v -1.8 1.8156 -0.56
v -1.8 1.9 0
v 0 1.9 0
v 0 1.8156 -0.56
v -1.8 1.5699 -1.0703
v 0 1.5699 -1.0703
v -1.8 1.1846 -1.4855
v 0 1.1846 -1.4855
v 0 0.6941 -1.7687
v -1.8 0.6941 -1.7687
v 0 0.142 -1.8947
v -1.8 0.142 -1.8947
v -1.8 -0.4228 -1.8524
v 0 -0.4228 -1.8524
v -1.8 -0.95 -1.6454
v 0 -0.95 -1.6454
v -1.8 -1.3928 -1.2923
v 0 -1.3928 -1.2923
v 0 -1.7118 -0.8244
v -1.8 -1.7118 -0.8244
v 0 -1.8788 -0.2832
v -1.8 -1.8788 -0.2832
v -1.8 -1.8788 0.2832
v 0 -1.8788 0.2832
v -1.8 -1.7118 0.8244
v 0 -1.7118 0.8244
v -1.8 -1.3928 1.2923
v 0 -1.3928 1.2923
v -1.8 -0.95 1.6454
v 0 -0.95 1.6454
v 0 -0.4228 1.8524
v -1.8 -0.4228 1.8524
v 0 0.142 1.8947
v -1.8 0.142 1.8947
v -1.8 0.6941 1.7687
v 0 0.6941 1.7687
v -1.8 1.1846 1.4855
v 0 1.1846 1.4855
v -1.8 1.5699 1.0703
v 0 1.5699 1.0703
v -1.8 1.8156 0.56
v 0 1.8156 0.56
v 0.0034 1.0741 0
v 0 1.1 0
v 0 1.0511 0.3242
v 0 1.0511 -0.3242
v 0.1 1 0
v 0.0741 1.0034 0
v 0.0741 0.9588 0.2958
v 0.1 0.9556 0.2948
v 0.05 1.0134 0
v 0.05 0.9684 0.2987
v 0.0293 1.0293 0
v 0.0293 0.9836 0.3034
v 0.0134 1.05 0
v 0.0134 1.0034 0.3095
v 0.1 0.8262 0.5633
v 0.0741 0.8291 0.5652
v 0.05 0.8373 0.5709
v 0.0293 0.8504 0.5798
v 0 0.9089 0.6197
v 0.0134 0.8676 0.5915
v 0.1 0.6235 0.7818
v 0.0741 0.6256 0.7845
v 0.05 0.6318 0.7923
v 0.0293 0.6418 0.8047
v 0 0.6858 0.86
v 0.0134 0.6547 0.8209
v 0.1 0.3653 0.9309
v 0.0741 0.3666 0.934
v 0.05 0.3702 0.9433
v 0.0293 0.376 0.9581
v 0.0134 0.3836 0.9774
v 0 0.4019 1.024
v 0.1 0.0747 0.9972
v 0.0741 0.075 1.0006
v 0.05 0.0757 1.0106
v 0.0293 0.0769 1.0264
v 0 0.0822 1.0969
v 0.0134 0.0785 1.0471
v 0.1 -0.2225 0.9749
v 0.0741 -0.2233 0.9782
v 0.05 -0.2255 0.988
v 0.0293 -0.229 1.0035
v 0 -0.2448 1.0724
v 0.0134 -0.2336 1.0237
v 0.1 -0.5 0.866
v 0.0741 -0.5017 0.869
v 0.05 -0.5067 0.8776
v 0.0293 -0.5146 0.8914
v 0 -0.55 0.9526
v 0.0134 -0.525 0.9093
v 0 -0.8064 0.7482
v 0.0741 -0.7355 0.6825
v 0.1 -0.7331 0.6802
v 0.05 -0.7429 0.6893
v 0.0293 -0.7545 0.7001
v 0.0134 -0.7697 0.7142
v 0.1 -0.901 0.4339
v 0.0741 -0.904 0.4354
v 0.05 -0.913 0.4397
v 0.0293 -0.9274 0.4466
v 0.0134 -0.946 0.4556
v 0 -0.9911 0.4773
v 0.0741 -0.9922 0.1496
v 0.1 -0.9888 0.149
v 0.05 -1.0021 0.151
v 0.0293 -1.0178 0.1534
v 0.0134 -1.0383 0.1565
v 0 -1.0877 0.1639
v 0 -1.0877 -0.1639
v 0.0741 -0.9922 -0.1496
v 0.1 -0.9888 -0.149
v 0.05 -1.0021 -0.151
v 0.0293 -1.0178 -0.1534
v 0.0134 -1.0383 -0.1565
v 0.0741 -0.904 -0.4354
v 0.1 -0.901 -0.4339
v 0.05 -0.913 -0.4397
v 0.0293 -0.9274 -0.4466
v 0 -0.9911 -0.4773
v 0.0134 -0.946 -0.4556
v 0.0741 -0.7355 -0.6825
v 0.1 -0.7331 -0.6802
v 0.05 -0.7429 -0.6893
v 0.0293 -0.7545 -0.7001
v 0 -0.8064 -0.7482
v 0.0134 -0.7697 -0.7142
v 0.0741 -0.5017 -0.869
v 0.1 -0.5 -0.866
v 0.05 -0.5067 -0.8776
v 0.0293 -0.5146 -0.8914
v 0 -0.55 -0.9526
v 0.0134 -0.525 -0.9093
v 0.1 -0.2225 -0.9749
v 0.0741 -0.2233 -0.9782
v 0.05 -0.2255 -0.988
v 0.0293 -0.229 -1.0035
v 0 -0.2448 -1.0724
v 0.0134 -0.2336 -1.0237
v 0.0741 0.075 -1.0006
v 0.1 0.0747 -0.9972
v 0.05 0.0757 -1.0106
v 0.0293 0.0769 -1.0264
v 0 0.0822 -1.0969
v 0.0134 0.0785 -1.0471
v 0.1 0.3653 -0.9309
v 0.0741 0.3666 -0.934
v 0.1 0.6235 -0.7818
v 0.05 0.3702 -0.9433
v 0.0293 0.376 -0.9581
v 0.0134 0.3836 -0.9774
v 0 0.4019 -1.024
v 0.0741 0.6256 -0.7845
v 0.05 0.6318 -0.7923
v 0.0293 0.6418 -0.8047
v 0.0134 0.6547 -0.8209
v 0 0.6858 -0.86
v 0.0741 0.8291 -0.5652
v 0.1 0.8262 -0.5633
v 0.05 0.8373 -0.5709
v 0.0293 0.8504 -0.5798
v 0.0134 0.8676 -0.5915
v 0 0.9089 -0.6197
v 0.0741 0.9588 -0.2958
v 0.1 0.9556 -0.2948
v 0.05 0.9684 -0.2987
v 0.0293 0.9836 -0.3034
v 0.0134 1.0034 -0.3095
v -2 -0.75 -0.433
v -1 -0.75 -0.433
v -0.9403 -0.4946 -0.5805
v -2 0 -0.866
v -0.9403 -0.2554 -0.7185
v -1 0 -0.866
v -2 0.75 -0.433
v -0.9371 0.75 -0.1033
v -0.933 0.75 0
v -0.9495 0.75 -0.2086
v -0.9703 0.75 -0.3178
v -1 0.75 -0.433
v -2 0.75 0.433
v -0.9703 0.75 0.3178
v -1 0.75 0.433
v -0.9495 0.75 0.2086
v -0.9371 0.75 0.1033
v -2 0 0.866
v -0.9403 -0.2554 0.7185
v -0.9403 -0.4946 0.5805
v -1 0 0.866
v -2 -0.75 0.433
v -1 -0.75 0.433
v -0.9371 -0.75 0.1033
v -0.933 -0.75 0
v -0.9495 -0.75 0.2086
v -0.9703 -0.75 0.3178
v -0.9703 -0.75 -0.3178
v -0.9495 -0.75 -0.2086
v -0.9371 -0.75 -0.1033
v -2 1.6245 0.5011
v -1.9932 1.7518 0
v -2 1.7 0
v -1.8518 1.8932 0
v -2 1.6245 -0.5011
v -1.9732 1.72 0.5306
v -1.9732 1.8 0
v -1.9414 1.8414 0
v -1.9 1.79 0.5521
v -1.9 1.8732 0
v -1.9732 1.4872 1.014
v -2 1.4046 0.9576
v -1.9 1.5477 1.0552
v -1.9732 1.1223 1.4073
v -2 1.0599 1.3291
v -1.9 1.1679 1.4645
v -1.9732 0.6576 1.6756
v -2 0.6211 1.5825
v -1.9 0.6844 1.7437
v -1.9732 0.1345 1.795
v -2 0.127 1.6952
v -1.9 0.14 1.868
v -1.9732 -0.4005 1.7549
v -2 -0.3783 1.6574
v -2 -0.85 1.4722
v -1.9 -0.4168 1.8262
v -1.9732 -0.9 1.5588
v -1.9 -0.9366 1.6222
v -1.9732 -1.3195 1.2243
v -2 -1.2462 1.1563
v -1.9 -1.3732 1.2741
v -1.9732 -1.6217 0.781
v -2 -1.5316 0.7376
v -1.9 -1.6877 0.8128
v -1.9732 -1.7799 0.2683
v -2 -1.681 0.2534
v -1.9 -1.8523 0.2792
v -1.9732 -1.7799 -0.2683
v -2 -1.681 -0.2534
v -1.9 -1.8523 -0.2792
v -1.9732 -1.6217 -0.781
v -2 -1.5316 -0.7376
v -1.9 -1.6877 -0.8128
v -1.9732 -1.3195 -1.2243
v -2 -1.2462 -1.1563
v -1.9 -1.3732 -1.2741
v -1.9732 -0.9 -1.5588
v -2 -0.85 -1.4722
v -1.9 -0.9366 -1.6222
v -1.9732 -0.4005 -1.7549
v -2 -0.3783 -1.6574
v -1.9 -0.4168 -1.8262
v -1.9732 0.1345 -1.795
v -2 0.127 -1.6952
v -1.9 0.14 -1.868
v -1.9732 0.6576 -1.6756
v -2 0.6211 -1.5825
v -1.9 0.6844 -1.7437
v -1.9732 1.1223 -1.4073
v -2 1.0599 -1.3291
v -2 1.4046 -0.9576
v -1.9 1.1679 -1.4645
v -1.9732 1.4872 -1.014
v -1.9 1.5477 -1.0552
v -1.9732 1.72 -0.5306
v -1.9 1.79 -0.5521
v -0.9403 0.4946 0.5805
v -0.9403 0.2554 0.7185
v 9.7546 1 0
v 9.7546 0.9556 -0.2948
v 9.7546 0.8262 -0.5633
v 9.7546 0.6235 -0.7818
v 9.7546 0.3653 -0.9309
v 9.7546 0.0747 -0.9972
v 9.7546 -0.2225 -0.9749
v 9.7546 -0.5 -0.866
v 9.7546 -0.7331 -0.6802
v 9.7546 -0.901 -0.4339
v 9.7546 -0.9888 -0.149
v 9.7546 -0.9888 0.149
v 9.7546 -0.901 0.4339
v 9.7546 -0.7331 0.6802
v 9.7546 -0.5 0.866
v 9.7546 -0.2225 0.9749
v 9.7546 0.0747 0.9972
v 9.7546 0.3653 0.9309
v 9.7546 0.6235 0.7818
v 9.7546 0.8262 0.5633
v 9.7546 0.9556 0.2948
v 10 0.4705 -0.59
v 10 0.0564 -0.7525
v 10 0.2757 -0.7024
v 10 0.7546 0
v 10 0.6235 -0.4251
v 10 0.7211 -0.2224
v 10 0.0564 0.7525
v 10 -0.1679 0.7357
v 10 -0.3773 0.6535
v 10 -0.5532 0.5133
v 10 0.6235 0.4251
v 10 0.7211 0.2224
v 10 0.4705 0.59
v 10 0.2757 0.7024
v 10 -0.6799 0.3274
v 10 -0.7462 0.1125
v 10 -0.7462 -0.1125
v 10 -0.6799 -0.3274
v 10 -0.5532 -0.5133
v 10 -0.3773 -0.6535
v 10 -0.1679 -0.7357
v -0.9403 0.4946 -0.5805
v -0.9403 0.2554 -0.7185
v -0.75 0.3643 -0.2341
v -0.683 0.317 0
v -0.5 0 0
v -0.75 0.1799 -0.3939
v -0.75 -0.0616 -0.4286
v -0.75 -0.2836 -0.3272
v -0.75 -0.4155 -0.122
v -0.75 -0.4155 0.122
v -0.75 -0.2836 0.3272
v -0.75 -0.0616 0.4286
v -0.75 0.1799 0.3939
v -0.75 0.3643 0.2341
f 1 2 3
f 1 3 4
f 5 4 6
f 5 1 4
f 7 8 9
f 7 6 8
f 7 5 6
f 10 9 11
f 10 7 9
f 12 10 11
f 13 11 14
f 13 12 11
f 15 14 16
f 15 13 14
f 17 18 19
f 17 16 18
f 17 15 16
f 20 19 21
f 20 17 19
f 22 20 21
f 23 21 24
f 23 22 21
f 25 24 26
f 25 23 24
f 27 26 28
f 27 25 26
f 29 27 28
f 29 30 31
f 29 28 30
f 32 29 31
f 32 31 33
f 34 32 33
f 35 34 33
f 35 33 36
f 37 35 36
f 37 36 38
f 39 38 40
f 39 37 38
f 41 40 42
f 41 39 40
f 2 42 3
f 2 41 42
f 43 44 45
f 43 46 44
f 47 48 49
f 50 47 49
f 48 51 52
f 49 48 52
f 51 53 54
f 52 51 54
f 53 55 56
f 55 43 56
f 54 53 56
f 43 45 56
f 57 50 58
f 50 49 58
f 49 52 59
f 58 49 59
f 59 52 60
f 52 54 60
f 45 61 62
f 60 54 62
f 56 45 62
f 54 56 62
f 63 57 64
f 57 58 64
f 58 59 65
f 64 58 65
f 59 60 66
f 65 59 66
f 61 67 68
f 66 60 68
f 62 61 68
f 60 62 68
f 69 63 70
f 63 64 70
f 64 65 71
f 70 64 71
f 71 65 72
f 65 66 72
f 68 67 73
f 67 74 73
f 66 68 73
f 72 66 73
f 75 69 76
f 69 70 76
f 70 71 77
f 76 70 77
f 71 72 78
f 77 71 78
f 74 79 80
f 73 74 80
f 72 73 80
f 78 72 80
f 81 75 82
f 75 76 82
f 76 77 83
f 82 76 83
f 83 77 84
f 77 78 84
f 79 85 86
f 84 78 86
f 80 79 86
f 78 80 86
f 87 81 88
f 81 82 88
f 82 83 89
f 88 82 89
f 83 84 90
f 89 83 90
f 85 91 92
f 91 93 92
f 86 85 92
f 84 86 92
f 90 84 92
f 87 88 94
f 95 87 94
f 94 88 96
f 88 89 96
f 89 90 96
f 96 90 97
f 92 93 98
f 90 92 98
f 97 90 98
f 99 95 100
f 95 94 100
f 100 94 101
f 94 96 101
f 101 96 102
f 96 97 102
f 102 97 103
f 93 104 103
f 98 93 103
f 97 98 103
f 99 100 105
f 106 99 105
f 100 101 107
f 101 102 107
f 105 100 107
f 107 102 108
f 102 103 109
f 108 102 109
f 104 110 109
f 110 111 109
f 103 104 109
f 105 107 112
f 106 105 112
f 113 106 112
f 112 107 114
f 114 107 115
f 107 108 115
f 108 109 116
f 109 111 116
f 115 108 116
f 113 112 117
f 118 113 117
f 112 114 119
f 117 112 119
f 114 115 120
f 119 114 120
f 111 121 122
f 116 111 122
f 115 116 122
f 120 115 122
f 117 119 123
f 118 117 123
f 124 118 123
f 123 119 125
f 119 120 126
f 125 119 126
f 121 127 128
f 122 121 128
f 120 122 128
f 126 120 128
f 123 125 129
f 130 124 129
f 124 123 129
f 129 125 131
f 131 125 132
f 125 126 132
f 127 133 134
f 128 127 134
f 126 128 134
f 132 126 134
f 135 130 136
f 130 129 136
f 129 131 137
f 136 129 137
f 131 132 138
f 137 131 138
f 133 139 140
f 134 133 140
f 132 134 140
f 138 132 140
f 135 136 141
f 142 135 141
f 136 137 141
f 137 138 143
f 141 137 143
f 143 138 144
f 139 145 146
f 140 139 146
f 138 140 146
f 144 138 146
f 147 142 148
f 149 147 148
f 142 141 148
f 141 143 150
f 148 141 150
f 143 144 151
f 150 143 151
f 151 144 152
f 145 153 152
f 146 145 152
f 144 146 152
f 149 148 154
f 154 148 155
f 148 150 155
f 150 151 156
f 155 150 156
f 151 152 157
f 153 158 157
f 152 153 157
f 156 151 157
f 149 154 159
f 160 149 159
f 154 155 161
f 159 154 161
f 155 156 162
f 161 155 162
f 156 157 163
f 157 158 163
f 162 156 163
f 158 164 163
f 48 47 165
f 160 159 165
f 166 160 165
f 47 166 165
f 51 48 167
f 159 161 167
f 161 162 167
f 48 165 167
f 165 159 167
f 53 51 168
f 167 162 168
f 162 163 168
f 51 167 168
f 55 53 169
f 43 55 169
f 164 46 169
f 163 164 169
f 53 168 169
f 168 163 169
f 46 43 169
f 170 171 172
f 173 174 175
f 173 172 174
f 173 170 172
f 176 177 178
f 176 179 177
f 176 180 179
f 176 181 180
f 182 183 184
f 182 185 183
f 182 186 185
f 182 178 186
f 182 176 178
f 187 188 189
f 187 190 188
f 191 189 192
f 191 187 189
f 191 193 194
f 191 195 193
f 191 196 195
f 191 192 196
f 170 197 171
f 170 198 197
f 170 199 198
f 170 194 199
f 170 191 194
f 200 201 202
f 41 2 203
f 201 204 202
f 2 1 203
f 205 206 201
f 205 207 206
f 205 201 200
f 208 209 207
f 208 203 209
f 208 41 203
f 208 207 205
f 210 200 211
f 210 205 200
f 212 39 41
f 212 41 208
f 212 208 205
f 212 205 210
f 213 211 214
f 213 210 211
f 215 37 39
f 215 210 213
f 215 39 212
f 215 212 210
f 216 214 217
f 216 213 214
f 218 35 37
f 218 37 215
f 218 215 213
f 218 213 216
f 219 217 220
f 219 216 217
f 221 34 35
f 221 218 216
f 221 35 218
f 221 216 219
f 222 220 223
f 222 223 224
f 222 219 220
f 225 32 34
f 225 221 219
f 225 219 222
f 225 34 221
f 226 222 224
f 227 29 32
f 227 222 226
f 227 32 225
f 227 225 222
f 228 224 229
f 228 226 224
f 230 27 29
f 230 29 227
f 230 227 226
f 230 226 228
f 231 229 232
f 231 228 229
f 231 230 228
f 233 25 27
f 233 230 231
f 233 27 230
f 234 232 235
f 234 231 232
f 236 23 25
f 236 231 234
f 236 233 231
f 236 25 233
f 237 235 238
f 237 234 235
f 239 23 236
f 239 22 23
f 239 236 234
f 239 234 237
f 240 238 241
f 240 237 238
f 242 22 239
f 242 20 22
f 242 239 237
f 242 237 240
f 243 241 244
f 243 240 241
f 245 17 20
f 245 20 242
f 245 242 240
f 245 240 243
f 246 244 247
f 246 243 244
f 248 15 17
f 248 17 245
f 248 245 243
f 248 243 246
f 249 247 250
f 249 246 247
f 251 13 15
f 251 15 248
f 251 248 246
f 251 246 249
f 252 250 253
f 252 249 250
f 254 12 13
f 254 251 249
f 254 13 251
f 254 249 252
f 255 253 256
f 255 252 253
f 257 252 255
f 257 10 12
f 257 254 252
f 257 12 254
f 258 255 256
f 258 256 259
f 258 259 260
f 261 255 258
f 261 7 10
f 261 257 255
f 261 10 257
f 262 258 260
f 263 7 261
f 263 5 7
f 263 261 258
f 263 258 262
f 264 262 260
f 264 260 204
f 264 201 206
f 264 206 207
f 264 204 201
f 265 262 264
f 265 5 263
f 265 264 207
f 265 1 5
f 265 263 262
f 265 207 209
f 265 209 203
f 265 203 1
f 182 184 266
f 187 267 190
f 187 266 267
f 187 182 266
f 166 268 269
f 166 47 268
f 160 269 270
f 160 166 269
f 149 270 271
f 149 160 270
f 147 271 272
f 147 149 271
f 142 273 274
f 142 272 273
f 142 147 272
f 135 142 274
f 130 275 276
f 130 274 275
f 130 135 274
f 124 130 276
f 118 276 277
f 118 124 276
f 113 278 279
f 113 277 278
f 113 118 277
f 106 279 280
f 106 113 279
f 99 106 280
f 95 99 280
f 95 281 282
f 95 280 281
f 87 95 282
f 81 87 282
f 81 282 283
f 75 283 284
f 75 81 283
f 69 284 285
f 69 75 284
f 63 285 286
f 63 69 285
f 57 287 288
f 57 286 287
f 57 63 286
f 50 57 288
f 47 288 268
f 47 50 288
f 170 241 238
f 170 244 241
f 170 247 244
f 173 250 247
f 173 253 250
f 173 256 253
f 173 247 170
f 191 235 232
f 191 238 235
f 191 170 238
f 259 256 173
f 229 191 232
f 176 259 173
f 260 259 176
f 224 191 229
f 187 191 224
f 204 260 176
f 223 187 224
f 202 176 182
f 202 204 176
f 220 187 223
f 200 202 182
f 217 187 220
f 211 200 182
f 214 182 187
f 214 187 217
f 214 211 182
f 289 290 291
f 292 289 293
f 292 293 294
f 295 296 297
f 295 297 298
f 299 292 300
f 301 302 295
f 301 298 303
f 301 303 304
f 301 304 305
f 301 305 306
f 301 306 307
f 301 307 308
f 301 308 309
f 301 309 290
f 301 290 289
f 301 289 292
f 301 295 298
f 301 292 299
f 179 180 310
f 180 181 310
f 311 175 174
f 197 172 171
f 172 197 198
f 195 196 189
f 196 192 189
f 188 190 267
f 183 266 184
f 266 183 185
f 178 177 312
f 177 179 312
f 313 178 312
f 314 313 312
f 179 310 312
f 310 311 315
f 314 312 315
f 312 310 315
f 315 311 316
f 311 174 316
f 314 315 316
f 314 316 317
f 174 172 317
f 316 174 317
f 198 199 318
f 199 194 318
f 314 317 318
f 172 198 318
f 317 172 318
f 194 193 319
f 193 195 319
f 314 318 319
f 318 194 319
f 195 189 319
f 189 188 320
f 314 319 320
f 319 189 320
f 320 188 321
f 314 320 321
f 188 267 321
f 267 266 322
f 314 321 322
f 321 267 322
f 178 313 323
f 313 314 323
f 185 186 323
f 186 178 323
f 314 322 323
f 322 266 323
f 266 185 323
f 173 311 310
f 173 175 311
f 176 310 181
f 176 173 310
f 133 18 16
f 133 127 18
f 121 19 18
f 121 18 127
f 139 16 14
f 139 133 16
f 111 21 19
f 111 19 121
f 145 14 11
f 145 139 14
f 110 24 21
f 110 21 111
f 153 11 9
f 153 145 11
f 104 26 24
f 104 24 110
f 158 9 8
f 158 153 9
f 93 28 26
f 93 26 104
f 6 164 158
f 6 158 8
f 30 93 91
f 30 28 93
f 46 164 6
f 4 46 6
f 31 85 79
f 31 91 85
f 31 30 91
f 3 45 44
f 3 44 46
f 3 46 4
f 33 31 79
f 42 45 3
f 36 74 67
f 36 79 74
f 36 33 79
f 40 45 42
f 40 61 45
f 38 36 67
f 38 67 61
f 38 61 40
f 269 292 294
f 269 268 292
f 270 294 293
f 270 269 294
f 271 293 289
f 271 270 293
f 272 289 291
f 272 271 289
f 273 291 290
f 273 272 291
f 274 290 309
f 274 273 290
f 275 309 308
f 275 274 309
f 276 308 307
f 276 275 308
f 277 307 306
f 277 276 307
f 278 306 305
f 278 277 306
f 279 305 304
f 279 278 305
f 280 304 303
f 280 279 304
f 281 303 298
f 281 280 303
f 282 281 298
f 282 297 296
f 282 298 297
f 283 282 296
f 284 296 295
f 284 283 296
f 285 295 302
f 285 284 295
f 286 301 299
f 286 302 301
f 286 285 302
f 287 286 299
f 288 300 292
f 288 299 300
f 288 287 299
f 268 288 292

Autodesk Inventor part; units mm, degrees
ref_plane "YZ Plane" through (0, 0, 0) normal (1, 0, 0) x (0, 1, 0)
ref_plane "XZ Plane" through (0, 0, 0) normal (0, 1, 0) x (-1, 0, 0)
sketch "Skizze1" plane through (0, 0, 0) normal (0, 0, 1) x (1, 0, 0)
  line L0 (-0.5, 0) -> (10, 0)
  line L1 (10, 0) -> (10, 1)
  line L2 (10, 1) -> (1.2, 1)
  line L3 (1.2, 1) -> (0.9545, 1)
  line L4 (0.9545, 1) -> (0, 1)
  line L5 (0, 1) -> (0, 1.9)
  line L6 (0, 1.9) -> (-2, 1.9)
  line L7 (-2, 1.9) -> (-2, 0.866)
  line L8 (-2, 0.866) -> (-1, 0.866)
  line L9 (-1, 0.866) -> (-0.5, 0)
  line L10 (-4.4, 0) -> (12.4, 0) projected
  line L11 (0, -0.38) -> (0, 2.28) projected
  line L12 (1.2, 1) -> (0, 1) construction
  dimension "d1" = 8.8
  dimension "d2" = 0.2455
  dimension "d3" = 2
  dimension "d4" = 1
  dimension "d5" = 60
  dimension "d6" = 2
  dimension "d7" = 2
  dimension "d8" = 1.7321
  dimension "d9" = 3.8
  dimension "d26" = 10
revolve "Körper" add sketch "Skizze1" angle 360 about axis through (-0.5, 0, 0) along (1, 0, 0)
sketch "Skizze2" plane through (-2, 0, 0) normal (-1, 0, 0) x (0, 0, 1)
  circle A0 centre (0, 0) radius 0.866 projected
  line L0 (0, -2.66) -> (0, 2.66) projected
  line L1 (-2.66, 0) -> (2.66, 0) projected
  line L2 (0.866, 0) -> (0.433, -0.75)
  line L3 (0.433, -0.75) -> (-0.433, -0.75)
  line L4 (-0.433, -0.75) -> (-0.866, 0)
  line L5 (-0.866, 0) -> (-0.433, 0.75)
  line L6 (-0.433, 0.75) -> (0.433, 0.75)
  line L7 (0.433, 0.75) -> (0.866, 0)
  point P0 (0, 0)
extrude "Loch" add sketch "Skizze2" against normal up to next contours L7 A0 | A0 L2 | L6 L0 A0 | A0 L0 L3 | L0 L6 A0 | A0 L3 L0 | L4 A0 | A0 L5
fillet "Rundung1" radius 0.2 1 edges at (-2, -1.9, 0)
thread "Gewinde" size "M2x0.4" class "6g" standard "ISO Metric profile" length 8.8
chamfer "Fase1" distance 0.2454 distance2 0.2454 1 edges at (10, -1, 0) measured on face at (10, -0.5392, -0.3309)
ref_plane "Work Plane1" through (29, 0, 0) normal (0, -1, 0) x (1, 0, 0)
fillet "Fillet2" radius 0.1 1 edges at (0, -1, 0)
equation "\"d1\" = GEL"
equation "\"d3\" = KOH"
equation "\"d4\" = INTI"
equation "\"d6\" = GD"
equation "\"d7\" = BDM"
equation "\"d8\" = 1.1547 * SW"
equation "\"d9\" = KOD"
equation "\"d26\" = NLG"
equation "\"d30\" = R"
equation "\"d17\" = RR"
equation "\"d13\" = GEL"
equation "\"d15\" = -0.5 * SPD + 0.5 * GD"
equation "\"d16\" = GUL"
equation "\"GD\" = 2"
equation "\"NLG\" = 10"
equation "\"GEL\" = 8.8"
equation "\"KOD\" = 3.8"
equation "\"KOH\" = 2"
equation "\"INTI\" = 1"
equation "\"GAL\" = 0.61345 * PTC"
equation "\"GUL\" = 0.61345 * PTC"
equation "\"BDM\" = NND"
equation "\"SW\" = 1.5"
equation "\"RR\" = 0.2"
equation "\"SPD\" = NND - 1.2269 * PTC"
equation "\"R\" = 0.1"
equation "\"TOA\" = 30deg"
equation "\"GD1\" = THREADDIA - 1.2269 * PTC"
equation "\"THREADDIA\" = 2"
equation "\"FAWI\" = 45deg"
equation "\"PTC\" = 0.4"
equation "\"NND\" = 2"
equation "\"E0\" = 1.155 * SW"
properties part number "ISO 4762  - M2 x 10" material "Edelstahl, 440C"
